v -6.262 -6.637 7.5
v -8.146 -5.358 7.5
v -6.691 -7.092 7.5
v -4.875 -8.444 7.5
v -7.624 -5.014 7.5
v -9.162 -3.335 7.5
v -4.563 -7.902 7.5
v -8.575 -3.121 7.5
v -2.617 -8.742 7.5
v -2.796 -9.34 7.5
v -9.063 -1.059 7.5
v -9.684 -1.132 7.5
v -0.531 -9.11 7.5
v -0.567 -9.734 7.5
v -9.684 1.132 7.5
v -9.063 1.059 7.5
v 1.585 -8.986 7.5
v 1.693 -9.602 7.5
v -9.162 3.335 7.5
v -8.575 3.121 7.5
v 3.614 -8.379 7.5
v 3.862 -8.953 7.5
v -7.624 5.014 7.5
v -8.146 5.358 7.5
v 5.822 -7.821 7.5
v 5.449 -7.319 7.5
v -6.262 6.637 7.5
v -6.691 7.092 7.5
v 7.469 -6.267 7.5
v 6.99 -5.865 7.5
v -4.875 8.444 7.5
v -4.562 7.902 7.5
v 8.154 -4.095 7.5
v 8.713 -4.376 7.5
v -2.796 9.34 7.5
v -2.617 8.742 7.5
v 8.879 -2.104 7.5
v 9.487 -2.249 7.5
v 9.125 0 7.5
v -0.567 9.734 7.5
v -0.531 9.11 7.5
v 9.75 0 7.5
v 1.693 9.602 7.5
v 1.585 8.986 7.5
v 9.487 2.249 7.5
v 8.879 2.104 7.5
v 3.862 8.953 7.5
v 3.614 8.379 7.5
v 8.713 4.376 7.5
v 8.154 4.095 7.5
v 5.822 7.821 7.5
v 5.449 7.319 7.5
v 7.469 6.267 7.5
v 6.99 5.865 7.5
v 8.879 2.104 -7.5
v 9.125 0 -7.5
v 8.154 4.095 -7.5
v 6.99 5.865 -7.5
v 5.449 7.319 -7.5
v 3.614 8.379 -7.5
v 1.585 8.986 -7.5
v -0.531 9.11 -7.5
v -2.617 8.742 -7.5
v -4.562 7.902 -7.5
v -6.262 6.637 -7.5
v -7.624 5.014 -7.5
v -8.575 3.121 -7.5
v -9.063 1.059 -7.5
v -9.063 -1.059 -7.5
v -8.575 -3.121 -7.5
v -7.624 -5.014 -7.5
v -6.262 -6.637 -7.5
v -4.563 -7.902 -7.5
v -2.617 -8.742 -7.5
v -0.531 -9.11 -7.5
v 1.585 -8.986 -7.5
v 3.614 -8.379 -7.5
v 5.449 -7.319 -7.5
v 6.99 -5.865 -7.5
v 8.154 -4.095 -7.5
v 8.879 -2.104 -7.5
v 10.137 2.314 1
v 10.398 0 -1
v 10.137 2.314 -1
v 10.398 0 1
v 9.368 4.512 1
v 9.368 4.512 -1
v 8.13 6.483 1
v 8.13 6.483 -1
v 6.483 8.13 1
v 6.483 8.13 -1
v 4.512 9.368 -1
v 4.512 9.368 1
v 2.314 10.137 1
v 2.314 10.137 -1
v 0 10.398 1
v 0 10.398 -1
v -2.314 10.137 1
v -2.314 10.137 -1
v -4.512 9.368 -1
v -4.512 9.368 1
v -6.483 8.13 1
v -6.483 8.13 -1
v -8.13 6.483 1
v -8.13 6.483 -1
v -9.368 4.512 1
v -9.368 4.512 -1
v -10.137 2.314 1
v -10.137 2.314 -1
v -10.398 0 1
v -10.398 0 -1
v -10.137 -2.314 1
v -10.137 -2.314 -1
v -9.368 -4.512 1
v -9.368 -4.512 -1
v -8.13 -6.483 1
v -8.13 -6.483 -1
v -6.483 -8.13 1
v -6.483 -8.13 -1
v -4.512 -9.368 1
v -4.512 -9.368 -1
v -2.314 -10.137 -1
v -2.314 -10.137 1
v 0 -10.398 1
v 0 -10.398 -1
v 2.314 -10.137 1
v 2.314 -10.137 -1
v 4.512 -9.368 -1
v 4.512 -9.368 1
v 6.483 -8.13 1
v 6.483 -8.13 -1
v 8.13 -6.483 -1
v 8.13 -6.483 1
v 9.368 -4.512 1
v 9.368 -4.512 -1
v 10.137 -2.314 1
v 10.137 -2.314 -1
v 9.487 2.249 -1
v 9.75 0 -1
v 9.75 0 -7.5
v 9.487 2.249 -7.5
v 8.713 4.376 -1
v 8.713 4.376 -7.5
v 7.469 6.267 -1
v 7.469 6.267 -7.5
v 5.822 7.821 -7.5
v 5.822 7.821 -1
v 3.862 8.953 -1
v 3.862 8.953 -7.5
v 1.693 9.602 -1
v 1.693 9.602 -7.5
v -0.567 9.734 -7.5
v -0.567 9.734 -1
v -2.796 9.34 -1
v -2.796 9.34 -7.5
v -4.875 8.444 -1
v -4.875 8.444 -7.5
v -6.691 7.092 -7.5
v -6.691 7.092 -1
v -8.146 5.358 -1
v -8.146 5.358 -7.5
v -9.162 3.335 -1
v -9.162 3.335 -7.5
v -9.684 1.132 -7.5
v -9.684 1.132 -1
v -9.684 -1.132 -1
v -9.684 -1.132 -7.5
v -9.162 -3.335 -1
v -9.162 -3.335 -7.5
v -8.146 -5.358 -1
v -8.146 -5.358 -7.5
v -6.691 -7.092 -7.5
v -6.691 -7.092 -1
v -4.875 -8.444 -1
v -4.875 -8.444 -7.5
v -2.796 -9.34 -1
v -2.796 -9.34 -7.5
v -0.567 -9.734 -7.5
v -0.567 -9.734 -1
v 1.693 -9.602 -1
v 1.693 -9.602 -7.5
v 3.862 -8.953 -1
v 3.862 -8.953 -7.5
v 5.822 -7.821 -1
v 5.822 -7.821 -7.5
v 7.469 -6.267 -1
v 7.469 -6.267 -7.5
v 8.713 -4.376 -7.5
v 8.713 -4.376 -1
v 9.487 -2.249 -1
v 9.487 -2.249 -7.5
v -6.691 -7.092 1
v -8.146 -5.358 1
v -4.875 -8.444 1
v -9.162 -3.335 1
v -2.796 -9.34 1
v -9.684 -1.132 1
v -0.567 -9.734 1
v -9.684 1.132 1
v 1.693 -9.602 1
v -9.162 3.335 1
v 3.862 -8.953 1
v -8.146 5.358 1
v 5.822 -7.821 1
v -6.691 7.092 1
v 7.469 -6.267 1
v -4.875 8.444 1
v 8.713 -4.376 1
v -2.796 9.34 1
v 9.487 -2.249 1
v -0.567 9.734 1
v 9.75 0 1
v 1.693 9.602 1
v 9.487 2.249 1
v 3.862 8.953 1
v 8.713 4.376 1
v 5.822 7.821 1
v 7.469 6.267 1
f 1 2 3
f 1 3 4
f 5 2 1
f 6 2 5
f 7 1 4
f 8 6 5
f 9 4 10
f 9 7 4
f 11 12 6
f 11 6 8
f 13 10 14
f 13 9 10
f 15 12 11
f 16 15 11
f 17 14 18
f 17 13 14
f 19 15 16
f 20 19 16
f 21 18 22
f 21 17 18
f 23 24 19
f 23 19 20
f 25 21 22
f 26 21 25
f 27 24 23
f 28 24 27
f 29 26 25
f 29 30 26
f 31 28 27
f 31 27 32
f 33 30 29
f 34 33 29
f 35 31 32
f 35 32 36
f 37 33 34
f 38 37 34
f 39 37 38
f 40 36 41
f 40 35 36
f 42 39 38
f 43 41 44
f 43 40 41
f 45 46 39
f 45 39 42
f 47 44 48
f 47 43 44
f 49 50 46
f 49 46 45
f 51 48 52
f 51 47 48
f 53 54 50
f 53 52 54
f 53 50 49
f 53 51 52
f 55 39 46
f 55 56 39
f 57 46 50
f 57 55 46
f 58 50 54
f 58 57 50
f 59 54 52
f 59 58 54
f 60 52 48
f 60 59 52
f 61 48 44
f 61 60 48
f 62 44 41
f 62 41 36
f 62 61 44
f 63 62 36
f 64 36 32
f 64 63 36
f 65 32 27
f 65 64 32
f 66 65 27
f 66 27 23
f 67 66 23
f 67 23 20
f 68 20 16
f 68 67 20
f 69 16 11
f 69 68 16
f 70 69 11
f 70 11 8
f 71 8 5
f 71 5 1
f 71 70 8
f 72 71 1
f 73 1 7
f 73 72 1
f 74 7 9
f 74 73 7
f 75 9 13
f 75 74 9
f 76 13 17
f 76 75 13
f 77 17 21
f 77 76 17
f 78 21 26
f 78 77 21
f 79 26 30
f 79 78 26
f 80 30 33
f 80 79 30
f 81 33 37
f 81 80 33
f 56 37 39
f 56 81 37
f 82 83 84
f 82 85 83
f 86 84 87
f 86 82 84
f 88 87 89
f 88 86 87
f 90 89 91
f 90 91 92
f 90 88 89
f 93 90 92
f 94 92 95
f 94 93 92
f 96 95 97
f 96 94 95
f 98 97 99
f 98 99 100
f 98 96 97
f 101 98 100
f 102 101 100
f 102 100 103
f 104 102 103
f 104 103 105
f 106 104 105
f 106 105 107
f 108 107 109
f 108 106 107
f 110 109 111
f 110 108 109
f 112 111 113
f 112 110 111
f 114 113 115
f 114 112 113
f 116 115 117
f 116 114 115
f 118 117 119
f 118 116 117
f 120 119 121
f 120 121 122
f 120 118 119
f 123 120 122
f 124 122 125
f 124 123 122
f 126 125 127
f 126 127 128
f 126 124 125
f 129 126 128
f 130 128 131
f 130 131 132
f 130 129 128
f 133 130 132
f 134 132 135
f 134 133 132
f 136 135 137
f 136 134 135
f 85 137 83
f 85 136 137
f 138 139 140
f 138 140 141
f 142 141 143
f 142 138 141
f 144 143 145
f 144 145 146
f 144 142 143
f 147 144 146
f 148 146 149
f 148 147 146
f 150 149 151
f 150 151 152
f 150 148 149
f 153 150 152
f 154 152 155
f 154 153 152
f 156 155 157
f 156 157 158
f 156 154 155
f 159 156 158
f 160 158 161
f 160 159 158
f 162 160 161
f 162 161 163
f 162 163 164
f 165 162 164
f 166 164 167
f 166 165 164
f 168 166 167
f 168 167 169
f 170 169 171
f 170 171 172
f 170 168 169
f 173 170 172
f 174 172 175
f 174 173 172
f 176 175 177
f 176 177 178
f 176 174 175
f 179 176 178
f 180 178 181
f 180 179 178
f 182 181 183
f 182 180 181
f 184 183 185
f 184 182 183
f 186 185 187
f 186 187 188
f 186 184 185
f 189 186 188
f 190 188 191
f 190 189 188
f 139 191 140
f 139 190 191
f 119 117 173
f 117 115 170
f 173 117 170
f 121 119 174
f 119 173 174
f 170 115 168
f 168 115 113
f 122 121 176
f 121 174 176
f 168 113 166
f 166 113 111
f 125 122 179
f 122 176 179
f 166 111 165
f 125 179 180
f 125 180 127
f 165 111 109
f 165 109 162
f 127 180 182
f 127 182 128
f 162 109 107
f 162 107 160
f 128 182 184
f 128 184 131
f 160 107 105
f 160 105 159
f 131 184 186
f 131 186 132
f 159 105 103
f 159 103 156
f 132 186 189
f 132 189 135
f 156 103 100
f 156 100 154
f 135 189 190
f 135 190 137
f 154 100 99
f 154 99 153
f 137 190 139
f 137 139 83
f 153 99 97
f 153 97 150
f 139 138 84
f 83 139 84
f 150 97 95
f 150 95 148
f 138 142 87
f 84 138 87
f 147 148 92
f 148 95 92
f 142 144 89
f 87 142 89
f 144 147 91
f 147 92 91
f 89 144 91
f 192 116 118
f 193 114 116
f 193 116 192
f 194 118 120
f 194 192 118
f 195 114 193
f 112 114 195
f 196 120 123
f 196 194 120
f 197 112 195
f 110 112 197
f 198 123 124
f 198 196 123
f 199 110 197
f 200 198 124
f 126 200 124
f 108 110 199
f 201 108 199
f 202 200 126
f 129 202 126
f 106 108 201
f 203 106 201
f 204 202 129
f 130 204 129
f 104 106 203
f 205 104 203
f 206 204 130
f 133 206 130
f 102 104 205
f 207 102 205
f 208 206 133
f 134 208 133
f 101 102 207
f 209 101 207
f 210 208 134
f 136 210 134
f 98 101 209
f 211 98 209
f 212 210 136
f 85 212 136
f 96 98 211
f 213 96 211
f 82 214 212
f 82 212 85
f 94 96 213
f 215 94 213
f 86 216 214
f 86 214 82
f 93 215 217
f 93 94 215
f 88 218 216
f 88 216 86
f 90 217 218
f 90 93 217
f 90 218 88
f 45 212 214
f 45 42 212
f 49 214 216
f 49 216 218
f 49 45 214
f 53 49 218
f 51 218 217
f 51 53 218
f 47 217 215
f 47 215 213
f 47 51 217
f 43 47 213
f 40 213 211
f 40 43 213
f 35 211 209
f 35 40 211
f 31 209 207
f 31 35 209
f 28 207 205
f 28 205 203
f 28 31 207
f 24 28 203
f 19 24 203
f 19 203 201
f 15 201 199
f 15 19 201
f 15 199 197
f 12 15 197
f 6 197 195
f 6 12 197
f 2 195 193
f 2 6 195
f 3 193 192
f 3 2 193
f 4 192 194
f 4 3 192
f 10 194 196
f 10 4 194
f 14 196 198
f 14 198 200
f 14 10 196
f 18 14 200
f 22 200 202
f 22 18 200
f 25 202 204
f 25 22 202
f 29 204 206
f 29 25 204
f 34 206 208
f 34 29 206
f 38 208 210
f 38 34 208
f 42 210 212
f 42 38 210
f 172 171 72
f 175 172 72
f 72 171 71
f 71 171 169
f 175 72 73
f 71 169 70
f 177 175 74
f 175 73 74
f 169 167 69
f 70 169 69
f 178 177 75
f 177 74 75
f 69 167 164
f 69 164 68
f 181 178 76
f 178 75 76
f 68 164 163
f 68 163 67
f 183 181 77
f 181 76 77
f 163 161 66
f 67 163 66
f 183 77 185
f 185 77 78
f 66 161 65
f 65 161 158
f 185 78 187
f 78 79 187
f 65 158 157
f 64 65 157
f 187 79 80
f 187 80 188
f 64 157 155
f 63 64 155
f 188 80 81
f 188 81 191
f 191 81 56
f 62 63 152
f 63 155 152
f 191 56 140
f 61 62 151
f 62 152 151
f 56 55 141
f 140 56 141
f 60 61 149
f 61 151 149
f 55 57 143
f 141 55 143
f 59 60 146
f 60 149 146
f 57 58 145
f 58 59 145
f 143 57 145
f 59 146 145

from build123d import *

# Parameters (mm, degrees)
F0_R     = 9.75
F0_R_2   = 9.125
F1_DEPTH = 7.5
F2_R     = 10.398155
F2_R_2   = 9.75
F3_DEPTH = 1


with BuildPart() as f1:
    # F0 (on Top) → F1 (new body, symmetric)
    with BuildSketch(Plane.XY):
        Circle(F0_R)
        Circle(F0_R_2, mode=Mode.SUBTRACT)
    extrude(amount=F1_DEPTH, both=True)

    # F2 (on Top) → F3 (join, symmetric)
    with BuildSketch(Plane.XY):
        Circle(F2_R)
        Circle(F2_R_2, mode=Mode.SUBTRACT)
    extrude(amount=F3_DEPTH, both=True)


solid = f1.part
